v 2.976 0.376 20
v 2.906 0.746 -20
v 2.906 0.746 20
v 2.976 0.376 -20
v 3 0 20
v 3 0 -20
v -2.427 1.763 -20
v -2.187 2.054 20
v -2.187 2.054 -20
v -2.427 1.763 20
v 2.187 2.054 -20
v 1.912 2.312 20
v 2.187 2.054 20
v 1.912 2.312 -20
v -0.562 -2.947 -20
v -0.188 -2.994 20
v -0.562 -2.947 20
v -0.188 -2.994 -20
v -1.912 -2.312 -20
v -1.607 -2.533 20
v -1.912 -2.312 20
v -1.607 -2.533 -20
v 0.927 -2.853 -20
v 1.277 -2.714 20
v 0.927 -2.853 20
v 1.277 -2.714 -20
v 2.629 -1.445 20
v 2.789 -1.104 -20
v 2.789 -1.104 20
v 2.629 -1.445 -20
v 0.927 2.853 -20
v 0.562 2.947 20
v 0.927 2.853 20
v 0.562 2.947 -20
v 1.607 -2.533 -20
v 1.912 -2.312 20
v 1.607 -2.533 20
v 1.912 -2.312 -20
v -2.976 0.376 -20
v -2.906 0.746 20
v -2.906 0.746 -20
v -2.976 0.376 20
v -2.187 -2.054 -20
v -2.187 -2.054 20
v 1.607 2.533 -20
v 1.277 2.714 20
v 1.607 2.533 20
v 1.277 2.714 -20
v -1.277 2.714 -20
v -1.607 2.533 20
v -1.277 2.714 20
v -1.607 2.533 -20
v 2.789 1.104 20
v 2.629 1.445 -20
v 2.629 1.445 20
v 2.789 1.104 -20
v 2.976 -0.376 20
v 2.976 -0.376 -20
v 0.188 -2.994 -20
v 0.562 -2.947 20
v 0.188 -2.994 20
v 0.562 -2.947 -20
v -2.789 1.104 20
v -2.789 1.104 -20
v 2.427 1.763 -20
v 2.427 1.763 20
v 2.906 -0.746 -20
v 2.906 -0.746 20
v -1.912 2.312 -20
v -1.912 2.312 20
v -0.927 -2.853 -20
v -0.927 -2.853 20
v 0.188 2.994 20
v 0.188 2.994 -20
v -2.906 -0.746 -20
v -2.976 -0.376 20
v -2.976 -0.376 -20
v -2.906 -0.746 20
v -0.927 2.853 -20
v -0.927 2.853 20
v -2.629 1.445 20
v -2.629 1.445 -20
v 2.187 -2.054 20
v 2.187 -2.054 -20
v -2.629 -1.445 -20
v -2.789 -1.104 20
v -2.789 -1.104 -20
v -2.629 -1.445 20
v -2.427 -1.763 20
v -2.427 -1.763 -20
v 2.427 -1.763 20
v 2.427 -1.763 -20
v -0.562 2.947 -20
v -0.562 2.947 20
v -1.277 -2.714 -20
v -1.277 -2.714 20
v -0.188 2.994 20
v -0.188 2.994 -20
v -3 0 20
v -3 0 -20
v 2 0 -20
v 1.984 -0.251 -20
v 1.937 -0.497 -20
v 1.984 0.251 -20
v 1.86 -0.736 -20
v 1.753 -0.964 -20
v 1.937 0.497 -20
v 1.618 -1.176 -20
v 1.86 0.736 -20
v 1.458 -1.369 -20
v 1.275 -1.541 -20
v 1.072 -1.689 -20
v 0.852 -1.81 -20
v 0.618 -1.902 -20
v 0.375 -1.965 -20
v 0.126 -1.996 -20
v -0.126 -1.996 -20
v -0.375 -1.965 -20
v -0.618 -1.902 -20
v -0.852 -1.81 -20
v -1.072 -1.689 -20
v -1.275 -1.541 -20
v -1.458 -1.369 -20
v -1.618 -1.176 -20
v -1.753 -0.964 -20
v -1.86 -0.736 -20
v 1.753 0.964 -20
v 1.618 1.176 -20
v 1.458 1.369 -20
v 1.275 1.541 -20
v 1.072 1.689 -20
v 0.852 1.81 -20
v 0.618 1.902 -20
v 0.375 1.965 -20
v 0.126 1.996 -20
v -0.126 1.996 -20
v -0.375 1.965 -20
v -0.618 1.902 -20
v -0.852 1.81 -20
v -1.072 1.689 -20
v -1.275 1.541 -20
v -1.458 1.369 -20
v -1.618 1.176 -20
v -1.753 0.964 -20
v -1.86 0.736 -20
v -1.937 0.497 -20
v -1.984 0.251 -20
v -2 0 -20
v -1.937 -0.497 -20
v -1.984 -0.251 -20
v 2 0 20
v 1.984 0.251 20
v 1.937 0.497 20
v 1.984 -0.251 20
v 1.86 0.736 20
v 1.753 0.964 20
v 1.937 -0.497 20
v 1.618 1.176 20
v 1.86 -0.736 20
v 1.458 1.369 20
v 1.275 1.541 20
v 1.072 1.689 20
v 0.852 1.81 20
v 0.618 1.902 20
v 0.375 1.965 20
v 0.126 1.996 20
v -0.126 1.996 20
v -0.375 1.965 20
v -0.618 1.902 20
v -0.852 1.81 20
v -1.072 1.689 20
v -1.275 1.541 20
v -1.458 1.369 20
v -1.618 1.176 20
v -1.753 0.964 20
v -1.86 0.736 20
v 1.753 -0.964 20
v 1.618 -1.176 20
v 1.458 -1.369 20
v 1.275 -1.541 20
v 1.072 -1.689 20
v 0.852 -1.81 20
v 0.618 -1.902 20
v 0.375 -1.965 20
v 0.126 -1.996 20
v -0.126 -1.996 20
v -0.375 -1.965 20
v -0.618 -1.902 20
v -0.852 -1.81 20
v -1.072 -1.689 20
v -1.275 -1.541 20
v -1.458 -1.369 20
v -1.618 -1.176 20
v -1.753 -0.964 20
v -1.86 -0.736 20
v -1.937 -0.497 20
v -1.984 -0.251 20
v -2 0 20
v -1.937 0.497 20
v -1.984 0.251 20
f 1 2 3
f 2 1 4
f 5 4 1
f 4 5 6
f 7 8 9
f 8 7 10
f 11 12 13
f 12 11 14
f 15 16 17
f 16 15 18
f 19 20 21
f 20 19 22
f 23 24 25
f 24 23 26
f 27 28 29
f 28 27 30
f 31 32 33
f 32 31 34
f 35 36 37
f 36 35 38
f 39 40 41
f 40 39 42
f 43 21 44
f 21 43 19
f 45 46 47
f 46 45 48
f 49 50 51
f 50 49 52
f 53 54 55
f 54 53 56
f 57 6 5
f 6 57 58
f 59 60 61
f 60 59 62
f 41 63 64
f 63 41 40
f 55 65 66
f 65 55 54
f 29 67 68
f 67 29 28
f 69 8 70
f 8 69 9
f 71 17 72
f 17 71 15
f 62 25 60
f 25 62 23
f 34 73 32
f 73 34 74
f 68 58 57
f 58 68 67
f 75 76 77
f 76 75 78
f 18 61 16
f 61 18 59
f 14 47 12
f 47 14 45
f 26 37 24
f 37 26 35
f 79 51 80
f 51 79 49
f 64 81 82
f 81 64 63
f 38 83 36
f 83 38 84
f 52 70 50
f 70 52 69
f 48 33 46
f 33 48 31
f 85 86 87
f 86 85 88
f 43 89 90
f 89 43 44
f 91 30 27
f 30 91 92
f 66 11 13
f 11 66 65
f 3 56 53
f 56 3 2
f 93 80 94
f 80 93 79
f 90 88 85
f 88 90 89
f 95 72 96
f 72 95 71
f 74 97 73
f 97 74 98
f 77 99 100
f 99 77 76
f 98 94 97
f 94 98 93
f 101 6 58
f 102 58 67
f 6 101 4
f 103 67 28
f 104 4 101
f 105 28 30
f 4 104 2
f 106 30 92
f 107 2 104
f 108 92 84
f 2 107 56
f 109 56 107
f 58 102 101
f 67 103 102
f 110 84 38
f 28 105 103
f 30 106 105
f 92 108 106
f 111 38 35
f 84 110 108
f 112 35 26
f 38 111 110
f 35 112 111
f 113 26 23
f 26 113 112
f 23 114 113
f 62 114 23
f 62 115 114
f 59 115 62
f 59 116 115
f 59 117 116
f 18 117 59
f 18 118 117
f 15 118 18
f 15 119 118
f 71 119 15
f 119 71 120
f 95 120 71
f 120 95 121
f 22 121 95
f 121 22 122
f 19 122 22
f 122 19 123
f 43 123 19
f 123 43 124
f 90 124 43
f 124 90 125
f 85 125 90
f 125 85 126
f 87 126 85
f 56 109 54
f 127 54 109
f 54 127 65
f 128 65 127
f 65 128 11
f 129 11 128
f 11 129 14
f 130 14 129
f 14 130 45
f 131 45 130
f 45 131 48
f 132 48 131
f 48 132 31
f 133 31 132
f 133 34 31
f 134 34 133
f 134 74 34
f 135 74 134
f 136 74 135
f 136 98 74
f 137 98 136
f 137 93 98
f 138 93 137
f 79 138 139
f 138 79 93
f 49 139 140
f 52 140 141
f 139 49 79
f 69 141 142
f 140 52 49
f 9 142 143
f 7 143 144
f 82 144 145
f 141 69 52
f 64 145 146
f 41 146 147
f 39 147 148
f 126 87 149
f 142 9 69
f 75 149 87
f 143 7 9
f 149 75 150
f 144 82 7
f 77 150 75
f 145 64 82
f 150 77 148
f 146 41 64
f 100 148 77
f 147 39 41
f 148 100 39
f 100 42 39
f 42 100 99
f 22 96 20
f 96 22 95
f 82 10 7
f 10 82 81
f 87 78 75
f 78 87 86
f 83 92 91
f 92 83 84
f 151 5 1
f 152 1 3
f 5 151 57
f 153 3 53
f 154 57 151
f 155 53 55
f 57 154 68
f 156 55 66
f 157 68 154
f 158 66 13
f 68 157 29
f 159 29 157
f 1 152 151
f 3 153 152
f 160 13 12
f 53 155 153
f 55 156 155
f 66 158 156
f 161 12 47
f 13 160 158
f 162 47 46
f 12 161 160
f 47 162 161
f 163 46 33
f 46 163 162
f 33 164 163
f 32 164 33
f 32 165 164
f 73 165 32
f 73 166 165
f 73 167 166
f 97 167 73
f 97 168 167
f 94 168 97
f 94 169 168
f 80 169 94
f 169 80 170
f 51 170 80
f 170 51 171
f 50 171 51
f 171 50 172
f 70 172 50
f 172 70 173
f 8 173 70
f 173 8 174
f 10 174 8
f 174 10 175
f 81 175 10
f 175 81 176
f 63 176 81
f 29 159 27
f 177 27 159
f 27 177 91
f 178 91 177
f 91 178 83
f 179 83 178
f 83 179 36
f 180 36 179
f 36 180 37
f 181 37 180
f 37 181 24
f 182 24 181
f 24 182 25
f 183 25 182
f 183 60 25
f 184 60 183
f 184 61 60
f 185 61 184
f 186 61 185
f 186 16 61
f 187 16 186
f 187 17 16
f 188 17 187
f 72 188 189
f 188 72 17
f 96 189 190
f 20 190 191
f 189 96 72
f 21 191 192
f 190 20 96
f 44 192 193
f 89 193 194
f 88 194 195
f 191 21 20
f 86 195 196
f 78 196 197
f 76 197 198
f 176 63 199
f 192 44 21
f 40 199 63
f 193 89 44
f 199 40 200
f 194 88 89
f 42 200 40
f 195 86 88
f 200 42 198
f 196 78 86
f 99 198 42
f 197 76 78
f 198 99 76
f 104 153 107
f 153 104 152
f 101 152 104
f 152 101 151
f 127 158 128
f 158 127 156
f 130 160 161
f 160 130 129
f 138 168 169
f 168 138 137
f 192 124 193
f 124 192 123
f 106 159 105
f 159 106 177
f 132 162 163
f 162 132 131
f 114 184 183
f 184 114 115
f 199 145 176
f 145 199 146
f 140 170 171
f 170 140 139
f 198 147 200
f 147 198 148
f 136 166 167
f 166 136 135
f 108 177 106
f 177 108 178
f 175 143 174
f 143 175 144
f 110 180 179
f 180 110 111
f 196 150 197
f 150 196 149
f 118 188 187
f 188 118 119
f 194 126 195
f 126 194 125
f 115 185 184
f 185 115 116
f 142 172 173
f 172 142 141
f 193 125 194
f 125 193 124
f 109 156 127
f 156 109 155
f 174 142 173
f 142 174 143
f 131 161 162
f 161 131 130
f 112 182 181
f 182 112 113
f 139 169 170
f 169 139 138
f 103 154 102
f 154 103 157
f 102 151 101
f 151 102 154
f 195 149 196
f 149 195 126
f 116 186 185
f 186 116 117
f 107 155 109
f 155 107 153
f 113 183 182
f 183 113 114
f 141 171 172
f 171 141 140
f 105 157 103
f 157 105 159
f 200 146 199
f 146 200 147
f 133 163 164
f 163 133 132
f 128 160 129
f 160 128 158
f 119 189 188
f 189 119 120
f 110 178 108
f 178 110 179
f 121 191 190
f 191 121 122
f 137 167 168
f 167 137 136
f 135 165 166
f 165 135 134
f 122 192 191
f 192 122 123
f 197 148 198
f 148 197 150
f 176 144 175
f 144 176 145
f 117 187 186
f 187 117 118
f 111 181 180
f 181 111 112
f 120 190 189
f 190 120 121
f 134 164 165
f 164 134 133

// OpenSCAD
$fn = 50;


difference() {
	union() {
		translate(v = [0, 0, -20.0000000000]) {
			cylinder(h = 40, r = 3.0000000000);
		}
	}
	union() {
		translate(v = [0, 0, -100.0000000000]) {
			cylinder(h = 200, r = 2.0000000000);
		}
	}
}
